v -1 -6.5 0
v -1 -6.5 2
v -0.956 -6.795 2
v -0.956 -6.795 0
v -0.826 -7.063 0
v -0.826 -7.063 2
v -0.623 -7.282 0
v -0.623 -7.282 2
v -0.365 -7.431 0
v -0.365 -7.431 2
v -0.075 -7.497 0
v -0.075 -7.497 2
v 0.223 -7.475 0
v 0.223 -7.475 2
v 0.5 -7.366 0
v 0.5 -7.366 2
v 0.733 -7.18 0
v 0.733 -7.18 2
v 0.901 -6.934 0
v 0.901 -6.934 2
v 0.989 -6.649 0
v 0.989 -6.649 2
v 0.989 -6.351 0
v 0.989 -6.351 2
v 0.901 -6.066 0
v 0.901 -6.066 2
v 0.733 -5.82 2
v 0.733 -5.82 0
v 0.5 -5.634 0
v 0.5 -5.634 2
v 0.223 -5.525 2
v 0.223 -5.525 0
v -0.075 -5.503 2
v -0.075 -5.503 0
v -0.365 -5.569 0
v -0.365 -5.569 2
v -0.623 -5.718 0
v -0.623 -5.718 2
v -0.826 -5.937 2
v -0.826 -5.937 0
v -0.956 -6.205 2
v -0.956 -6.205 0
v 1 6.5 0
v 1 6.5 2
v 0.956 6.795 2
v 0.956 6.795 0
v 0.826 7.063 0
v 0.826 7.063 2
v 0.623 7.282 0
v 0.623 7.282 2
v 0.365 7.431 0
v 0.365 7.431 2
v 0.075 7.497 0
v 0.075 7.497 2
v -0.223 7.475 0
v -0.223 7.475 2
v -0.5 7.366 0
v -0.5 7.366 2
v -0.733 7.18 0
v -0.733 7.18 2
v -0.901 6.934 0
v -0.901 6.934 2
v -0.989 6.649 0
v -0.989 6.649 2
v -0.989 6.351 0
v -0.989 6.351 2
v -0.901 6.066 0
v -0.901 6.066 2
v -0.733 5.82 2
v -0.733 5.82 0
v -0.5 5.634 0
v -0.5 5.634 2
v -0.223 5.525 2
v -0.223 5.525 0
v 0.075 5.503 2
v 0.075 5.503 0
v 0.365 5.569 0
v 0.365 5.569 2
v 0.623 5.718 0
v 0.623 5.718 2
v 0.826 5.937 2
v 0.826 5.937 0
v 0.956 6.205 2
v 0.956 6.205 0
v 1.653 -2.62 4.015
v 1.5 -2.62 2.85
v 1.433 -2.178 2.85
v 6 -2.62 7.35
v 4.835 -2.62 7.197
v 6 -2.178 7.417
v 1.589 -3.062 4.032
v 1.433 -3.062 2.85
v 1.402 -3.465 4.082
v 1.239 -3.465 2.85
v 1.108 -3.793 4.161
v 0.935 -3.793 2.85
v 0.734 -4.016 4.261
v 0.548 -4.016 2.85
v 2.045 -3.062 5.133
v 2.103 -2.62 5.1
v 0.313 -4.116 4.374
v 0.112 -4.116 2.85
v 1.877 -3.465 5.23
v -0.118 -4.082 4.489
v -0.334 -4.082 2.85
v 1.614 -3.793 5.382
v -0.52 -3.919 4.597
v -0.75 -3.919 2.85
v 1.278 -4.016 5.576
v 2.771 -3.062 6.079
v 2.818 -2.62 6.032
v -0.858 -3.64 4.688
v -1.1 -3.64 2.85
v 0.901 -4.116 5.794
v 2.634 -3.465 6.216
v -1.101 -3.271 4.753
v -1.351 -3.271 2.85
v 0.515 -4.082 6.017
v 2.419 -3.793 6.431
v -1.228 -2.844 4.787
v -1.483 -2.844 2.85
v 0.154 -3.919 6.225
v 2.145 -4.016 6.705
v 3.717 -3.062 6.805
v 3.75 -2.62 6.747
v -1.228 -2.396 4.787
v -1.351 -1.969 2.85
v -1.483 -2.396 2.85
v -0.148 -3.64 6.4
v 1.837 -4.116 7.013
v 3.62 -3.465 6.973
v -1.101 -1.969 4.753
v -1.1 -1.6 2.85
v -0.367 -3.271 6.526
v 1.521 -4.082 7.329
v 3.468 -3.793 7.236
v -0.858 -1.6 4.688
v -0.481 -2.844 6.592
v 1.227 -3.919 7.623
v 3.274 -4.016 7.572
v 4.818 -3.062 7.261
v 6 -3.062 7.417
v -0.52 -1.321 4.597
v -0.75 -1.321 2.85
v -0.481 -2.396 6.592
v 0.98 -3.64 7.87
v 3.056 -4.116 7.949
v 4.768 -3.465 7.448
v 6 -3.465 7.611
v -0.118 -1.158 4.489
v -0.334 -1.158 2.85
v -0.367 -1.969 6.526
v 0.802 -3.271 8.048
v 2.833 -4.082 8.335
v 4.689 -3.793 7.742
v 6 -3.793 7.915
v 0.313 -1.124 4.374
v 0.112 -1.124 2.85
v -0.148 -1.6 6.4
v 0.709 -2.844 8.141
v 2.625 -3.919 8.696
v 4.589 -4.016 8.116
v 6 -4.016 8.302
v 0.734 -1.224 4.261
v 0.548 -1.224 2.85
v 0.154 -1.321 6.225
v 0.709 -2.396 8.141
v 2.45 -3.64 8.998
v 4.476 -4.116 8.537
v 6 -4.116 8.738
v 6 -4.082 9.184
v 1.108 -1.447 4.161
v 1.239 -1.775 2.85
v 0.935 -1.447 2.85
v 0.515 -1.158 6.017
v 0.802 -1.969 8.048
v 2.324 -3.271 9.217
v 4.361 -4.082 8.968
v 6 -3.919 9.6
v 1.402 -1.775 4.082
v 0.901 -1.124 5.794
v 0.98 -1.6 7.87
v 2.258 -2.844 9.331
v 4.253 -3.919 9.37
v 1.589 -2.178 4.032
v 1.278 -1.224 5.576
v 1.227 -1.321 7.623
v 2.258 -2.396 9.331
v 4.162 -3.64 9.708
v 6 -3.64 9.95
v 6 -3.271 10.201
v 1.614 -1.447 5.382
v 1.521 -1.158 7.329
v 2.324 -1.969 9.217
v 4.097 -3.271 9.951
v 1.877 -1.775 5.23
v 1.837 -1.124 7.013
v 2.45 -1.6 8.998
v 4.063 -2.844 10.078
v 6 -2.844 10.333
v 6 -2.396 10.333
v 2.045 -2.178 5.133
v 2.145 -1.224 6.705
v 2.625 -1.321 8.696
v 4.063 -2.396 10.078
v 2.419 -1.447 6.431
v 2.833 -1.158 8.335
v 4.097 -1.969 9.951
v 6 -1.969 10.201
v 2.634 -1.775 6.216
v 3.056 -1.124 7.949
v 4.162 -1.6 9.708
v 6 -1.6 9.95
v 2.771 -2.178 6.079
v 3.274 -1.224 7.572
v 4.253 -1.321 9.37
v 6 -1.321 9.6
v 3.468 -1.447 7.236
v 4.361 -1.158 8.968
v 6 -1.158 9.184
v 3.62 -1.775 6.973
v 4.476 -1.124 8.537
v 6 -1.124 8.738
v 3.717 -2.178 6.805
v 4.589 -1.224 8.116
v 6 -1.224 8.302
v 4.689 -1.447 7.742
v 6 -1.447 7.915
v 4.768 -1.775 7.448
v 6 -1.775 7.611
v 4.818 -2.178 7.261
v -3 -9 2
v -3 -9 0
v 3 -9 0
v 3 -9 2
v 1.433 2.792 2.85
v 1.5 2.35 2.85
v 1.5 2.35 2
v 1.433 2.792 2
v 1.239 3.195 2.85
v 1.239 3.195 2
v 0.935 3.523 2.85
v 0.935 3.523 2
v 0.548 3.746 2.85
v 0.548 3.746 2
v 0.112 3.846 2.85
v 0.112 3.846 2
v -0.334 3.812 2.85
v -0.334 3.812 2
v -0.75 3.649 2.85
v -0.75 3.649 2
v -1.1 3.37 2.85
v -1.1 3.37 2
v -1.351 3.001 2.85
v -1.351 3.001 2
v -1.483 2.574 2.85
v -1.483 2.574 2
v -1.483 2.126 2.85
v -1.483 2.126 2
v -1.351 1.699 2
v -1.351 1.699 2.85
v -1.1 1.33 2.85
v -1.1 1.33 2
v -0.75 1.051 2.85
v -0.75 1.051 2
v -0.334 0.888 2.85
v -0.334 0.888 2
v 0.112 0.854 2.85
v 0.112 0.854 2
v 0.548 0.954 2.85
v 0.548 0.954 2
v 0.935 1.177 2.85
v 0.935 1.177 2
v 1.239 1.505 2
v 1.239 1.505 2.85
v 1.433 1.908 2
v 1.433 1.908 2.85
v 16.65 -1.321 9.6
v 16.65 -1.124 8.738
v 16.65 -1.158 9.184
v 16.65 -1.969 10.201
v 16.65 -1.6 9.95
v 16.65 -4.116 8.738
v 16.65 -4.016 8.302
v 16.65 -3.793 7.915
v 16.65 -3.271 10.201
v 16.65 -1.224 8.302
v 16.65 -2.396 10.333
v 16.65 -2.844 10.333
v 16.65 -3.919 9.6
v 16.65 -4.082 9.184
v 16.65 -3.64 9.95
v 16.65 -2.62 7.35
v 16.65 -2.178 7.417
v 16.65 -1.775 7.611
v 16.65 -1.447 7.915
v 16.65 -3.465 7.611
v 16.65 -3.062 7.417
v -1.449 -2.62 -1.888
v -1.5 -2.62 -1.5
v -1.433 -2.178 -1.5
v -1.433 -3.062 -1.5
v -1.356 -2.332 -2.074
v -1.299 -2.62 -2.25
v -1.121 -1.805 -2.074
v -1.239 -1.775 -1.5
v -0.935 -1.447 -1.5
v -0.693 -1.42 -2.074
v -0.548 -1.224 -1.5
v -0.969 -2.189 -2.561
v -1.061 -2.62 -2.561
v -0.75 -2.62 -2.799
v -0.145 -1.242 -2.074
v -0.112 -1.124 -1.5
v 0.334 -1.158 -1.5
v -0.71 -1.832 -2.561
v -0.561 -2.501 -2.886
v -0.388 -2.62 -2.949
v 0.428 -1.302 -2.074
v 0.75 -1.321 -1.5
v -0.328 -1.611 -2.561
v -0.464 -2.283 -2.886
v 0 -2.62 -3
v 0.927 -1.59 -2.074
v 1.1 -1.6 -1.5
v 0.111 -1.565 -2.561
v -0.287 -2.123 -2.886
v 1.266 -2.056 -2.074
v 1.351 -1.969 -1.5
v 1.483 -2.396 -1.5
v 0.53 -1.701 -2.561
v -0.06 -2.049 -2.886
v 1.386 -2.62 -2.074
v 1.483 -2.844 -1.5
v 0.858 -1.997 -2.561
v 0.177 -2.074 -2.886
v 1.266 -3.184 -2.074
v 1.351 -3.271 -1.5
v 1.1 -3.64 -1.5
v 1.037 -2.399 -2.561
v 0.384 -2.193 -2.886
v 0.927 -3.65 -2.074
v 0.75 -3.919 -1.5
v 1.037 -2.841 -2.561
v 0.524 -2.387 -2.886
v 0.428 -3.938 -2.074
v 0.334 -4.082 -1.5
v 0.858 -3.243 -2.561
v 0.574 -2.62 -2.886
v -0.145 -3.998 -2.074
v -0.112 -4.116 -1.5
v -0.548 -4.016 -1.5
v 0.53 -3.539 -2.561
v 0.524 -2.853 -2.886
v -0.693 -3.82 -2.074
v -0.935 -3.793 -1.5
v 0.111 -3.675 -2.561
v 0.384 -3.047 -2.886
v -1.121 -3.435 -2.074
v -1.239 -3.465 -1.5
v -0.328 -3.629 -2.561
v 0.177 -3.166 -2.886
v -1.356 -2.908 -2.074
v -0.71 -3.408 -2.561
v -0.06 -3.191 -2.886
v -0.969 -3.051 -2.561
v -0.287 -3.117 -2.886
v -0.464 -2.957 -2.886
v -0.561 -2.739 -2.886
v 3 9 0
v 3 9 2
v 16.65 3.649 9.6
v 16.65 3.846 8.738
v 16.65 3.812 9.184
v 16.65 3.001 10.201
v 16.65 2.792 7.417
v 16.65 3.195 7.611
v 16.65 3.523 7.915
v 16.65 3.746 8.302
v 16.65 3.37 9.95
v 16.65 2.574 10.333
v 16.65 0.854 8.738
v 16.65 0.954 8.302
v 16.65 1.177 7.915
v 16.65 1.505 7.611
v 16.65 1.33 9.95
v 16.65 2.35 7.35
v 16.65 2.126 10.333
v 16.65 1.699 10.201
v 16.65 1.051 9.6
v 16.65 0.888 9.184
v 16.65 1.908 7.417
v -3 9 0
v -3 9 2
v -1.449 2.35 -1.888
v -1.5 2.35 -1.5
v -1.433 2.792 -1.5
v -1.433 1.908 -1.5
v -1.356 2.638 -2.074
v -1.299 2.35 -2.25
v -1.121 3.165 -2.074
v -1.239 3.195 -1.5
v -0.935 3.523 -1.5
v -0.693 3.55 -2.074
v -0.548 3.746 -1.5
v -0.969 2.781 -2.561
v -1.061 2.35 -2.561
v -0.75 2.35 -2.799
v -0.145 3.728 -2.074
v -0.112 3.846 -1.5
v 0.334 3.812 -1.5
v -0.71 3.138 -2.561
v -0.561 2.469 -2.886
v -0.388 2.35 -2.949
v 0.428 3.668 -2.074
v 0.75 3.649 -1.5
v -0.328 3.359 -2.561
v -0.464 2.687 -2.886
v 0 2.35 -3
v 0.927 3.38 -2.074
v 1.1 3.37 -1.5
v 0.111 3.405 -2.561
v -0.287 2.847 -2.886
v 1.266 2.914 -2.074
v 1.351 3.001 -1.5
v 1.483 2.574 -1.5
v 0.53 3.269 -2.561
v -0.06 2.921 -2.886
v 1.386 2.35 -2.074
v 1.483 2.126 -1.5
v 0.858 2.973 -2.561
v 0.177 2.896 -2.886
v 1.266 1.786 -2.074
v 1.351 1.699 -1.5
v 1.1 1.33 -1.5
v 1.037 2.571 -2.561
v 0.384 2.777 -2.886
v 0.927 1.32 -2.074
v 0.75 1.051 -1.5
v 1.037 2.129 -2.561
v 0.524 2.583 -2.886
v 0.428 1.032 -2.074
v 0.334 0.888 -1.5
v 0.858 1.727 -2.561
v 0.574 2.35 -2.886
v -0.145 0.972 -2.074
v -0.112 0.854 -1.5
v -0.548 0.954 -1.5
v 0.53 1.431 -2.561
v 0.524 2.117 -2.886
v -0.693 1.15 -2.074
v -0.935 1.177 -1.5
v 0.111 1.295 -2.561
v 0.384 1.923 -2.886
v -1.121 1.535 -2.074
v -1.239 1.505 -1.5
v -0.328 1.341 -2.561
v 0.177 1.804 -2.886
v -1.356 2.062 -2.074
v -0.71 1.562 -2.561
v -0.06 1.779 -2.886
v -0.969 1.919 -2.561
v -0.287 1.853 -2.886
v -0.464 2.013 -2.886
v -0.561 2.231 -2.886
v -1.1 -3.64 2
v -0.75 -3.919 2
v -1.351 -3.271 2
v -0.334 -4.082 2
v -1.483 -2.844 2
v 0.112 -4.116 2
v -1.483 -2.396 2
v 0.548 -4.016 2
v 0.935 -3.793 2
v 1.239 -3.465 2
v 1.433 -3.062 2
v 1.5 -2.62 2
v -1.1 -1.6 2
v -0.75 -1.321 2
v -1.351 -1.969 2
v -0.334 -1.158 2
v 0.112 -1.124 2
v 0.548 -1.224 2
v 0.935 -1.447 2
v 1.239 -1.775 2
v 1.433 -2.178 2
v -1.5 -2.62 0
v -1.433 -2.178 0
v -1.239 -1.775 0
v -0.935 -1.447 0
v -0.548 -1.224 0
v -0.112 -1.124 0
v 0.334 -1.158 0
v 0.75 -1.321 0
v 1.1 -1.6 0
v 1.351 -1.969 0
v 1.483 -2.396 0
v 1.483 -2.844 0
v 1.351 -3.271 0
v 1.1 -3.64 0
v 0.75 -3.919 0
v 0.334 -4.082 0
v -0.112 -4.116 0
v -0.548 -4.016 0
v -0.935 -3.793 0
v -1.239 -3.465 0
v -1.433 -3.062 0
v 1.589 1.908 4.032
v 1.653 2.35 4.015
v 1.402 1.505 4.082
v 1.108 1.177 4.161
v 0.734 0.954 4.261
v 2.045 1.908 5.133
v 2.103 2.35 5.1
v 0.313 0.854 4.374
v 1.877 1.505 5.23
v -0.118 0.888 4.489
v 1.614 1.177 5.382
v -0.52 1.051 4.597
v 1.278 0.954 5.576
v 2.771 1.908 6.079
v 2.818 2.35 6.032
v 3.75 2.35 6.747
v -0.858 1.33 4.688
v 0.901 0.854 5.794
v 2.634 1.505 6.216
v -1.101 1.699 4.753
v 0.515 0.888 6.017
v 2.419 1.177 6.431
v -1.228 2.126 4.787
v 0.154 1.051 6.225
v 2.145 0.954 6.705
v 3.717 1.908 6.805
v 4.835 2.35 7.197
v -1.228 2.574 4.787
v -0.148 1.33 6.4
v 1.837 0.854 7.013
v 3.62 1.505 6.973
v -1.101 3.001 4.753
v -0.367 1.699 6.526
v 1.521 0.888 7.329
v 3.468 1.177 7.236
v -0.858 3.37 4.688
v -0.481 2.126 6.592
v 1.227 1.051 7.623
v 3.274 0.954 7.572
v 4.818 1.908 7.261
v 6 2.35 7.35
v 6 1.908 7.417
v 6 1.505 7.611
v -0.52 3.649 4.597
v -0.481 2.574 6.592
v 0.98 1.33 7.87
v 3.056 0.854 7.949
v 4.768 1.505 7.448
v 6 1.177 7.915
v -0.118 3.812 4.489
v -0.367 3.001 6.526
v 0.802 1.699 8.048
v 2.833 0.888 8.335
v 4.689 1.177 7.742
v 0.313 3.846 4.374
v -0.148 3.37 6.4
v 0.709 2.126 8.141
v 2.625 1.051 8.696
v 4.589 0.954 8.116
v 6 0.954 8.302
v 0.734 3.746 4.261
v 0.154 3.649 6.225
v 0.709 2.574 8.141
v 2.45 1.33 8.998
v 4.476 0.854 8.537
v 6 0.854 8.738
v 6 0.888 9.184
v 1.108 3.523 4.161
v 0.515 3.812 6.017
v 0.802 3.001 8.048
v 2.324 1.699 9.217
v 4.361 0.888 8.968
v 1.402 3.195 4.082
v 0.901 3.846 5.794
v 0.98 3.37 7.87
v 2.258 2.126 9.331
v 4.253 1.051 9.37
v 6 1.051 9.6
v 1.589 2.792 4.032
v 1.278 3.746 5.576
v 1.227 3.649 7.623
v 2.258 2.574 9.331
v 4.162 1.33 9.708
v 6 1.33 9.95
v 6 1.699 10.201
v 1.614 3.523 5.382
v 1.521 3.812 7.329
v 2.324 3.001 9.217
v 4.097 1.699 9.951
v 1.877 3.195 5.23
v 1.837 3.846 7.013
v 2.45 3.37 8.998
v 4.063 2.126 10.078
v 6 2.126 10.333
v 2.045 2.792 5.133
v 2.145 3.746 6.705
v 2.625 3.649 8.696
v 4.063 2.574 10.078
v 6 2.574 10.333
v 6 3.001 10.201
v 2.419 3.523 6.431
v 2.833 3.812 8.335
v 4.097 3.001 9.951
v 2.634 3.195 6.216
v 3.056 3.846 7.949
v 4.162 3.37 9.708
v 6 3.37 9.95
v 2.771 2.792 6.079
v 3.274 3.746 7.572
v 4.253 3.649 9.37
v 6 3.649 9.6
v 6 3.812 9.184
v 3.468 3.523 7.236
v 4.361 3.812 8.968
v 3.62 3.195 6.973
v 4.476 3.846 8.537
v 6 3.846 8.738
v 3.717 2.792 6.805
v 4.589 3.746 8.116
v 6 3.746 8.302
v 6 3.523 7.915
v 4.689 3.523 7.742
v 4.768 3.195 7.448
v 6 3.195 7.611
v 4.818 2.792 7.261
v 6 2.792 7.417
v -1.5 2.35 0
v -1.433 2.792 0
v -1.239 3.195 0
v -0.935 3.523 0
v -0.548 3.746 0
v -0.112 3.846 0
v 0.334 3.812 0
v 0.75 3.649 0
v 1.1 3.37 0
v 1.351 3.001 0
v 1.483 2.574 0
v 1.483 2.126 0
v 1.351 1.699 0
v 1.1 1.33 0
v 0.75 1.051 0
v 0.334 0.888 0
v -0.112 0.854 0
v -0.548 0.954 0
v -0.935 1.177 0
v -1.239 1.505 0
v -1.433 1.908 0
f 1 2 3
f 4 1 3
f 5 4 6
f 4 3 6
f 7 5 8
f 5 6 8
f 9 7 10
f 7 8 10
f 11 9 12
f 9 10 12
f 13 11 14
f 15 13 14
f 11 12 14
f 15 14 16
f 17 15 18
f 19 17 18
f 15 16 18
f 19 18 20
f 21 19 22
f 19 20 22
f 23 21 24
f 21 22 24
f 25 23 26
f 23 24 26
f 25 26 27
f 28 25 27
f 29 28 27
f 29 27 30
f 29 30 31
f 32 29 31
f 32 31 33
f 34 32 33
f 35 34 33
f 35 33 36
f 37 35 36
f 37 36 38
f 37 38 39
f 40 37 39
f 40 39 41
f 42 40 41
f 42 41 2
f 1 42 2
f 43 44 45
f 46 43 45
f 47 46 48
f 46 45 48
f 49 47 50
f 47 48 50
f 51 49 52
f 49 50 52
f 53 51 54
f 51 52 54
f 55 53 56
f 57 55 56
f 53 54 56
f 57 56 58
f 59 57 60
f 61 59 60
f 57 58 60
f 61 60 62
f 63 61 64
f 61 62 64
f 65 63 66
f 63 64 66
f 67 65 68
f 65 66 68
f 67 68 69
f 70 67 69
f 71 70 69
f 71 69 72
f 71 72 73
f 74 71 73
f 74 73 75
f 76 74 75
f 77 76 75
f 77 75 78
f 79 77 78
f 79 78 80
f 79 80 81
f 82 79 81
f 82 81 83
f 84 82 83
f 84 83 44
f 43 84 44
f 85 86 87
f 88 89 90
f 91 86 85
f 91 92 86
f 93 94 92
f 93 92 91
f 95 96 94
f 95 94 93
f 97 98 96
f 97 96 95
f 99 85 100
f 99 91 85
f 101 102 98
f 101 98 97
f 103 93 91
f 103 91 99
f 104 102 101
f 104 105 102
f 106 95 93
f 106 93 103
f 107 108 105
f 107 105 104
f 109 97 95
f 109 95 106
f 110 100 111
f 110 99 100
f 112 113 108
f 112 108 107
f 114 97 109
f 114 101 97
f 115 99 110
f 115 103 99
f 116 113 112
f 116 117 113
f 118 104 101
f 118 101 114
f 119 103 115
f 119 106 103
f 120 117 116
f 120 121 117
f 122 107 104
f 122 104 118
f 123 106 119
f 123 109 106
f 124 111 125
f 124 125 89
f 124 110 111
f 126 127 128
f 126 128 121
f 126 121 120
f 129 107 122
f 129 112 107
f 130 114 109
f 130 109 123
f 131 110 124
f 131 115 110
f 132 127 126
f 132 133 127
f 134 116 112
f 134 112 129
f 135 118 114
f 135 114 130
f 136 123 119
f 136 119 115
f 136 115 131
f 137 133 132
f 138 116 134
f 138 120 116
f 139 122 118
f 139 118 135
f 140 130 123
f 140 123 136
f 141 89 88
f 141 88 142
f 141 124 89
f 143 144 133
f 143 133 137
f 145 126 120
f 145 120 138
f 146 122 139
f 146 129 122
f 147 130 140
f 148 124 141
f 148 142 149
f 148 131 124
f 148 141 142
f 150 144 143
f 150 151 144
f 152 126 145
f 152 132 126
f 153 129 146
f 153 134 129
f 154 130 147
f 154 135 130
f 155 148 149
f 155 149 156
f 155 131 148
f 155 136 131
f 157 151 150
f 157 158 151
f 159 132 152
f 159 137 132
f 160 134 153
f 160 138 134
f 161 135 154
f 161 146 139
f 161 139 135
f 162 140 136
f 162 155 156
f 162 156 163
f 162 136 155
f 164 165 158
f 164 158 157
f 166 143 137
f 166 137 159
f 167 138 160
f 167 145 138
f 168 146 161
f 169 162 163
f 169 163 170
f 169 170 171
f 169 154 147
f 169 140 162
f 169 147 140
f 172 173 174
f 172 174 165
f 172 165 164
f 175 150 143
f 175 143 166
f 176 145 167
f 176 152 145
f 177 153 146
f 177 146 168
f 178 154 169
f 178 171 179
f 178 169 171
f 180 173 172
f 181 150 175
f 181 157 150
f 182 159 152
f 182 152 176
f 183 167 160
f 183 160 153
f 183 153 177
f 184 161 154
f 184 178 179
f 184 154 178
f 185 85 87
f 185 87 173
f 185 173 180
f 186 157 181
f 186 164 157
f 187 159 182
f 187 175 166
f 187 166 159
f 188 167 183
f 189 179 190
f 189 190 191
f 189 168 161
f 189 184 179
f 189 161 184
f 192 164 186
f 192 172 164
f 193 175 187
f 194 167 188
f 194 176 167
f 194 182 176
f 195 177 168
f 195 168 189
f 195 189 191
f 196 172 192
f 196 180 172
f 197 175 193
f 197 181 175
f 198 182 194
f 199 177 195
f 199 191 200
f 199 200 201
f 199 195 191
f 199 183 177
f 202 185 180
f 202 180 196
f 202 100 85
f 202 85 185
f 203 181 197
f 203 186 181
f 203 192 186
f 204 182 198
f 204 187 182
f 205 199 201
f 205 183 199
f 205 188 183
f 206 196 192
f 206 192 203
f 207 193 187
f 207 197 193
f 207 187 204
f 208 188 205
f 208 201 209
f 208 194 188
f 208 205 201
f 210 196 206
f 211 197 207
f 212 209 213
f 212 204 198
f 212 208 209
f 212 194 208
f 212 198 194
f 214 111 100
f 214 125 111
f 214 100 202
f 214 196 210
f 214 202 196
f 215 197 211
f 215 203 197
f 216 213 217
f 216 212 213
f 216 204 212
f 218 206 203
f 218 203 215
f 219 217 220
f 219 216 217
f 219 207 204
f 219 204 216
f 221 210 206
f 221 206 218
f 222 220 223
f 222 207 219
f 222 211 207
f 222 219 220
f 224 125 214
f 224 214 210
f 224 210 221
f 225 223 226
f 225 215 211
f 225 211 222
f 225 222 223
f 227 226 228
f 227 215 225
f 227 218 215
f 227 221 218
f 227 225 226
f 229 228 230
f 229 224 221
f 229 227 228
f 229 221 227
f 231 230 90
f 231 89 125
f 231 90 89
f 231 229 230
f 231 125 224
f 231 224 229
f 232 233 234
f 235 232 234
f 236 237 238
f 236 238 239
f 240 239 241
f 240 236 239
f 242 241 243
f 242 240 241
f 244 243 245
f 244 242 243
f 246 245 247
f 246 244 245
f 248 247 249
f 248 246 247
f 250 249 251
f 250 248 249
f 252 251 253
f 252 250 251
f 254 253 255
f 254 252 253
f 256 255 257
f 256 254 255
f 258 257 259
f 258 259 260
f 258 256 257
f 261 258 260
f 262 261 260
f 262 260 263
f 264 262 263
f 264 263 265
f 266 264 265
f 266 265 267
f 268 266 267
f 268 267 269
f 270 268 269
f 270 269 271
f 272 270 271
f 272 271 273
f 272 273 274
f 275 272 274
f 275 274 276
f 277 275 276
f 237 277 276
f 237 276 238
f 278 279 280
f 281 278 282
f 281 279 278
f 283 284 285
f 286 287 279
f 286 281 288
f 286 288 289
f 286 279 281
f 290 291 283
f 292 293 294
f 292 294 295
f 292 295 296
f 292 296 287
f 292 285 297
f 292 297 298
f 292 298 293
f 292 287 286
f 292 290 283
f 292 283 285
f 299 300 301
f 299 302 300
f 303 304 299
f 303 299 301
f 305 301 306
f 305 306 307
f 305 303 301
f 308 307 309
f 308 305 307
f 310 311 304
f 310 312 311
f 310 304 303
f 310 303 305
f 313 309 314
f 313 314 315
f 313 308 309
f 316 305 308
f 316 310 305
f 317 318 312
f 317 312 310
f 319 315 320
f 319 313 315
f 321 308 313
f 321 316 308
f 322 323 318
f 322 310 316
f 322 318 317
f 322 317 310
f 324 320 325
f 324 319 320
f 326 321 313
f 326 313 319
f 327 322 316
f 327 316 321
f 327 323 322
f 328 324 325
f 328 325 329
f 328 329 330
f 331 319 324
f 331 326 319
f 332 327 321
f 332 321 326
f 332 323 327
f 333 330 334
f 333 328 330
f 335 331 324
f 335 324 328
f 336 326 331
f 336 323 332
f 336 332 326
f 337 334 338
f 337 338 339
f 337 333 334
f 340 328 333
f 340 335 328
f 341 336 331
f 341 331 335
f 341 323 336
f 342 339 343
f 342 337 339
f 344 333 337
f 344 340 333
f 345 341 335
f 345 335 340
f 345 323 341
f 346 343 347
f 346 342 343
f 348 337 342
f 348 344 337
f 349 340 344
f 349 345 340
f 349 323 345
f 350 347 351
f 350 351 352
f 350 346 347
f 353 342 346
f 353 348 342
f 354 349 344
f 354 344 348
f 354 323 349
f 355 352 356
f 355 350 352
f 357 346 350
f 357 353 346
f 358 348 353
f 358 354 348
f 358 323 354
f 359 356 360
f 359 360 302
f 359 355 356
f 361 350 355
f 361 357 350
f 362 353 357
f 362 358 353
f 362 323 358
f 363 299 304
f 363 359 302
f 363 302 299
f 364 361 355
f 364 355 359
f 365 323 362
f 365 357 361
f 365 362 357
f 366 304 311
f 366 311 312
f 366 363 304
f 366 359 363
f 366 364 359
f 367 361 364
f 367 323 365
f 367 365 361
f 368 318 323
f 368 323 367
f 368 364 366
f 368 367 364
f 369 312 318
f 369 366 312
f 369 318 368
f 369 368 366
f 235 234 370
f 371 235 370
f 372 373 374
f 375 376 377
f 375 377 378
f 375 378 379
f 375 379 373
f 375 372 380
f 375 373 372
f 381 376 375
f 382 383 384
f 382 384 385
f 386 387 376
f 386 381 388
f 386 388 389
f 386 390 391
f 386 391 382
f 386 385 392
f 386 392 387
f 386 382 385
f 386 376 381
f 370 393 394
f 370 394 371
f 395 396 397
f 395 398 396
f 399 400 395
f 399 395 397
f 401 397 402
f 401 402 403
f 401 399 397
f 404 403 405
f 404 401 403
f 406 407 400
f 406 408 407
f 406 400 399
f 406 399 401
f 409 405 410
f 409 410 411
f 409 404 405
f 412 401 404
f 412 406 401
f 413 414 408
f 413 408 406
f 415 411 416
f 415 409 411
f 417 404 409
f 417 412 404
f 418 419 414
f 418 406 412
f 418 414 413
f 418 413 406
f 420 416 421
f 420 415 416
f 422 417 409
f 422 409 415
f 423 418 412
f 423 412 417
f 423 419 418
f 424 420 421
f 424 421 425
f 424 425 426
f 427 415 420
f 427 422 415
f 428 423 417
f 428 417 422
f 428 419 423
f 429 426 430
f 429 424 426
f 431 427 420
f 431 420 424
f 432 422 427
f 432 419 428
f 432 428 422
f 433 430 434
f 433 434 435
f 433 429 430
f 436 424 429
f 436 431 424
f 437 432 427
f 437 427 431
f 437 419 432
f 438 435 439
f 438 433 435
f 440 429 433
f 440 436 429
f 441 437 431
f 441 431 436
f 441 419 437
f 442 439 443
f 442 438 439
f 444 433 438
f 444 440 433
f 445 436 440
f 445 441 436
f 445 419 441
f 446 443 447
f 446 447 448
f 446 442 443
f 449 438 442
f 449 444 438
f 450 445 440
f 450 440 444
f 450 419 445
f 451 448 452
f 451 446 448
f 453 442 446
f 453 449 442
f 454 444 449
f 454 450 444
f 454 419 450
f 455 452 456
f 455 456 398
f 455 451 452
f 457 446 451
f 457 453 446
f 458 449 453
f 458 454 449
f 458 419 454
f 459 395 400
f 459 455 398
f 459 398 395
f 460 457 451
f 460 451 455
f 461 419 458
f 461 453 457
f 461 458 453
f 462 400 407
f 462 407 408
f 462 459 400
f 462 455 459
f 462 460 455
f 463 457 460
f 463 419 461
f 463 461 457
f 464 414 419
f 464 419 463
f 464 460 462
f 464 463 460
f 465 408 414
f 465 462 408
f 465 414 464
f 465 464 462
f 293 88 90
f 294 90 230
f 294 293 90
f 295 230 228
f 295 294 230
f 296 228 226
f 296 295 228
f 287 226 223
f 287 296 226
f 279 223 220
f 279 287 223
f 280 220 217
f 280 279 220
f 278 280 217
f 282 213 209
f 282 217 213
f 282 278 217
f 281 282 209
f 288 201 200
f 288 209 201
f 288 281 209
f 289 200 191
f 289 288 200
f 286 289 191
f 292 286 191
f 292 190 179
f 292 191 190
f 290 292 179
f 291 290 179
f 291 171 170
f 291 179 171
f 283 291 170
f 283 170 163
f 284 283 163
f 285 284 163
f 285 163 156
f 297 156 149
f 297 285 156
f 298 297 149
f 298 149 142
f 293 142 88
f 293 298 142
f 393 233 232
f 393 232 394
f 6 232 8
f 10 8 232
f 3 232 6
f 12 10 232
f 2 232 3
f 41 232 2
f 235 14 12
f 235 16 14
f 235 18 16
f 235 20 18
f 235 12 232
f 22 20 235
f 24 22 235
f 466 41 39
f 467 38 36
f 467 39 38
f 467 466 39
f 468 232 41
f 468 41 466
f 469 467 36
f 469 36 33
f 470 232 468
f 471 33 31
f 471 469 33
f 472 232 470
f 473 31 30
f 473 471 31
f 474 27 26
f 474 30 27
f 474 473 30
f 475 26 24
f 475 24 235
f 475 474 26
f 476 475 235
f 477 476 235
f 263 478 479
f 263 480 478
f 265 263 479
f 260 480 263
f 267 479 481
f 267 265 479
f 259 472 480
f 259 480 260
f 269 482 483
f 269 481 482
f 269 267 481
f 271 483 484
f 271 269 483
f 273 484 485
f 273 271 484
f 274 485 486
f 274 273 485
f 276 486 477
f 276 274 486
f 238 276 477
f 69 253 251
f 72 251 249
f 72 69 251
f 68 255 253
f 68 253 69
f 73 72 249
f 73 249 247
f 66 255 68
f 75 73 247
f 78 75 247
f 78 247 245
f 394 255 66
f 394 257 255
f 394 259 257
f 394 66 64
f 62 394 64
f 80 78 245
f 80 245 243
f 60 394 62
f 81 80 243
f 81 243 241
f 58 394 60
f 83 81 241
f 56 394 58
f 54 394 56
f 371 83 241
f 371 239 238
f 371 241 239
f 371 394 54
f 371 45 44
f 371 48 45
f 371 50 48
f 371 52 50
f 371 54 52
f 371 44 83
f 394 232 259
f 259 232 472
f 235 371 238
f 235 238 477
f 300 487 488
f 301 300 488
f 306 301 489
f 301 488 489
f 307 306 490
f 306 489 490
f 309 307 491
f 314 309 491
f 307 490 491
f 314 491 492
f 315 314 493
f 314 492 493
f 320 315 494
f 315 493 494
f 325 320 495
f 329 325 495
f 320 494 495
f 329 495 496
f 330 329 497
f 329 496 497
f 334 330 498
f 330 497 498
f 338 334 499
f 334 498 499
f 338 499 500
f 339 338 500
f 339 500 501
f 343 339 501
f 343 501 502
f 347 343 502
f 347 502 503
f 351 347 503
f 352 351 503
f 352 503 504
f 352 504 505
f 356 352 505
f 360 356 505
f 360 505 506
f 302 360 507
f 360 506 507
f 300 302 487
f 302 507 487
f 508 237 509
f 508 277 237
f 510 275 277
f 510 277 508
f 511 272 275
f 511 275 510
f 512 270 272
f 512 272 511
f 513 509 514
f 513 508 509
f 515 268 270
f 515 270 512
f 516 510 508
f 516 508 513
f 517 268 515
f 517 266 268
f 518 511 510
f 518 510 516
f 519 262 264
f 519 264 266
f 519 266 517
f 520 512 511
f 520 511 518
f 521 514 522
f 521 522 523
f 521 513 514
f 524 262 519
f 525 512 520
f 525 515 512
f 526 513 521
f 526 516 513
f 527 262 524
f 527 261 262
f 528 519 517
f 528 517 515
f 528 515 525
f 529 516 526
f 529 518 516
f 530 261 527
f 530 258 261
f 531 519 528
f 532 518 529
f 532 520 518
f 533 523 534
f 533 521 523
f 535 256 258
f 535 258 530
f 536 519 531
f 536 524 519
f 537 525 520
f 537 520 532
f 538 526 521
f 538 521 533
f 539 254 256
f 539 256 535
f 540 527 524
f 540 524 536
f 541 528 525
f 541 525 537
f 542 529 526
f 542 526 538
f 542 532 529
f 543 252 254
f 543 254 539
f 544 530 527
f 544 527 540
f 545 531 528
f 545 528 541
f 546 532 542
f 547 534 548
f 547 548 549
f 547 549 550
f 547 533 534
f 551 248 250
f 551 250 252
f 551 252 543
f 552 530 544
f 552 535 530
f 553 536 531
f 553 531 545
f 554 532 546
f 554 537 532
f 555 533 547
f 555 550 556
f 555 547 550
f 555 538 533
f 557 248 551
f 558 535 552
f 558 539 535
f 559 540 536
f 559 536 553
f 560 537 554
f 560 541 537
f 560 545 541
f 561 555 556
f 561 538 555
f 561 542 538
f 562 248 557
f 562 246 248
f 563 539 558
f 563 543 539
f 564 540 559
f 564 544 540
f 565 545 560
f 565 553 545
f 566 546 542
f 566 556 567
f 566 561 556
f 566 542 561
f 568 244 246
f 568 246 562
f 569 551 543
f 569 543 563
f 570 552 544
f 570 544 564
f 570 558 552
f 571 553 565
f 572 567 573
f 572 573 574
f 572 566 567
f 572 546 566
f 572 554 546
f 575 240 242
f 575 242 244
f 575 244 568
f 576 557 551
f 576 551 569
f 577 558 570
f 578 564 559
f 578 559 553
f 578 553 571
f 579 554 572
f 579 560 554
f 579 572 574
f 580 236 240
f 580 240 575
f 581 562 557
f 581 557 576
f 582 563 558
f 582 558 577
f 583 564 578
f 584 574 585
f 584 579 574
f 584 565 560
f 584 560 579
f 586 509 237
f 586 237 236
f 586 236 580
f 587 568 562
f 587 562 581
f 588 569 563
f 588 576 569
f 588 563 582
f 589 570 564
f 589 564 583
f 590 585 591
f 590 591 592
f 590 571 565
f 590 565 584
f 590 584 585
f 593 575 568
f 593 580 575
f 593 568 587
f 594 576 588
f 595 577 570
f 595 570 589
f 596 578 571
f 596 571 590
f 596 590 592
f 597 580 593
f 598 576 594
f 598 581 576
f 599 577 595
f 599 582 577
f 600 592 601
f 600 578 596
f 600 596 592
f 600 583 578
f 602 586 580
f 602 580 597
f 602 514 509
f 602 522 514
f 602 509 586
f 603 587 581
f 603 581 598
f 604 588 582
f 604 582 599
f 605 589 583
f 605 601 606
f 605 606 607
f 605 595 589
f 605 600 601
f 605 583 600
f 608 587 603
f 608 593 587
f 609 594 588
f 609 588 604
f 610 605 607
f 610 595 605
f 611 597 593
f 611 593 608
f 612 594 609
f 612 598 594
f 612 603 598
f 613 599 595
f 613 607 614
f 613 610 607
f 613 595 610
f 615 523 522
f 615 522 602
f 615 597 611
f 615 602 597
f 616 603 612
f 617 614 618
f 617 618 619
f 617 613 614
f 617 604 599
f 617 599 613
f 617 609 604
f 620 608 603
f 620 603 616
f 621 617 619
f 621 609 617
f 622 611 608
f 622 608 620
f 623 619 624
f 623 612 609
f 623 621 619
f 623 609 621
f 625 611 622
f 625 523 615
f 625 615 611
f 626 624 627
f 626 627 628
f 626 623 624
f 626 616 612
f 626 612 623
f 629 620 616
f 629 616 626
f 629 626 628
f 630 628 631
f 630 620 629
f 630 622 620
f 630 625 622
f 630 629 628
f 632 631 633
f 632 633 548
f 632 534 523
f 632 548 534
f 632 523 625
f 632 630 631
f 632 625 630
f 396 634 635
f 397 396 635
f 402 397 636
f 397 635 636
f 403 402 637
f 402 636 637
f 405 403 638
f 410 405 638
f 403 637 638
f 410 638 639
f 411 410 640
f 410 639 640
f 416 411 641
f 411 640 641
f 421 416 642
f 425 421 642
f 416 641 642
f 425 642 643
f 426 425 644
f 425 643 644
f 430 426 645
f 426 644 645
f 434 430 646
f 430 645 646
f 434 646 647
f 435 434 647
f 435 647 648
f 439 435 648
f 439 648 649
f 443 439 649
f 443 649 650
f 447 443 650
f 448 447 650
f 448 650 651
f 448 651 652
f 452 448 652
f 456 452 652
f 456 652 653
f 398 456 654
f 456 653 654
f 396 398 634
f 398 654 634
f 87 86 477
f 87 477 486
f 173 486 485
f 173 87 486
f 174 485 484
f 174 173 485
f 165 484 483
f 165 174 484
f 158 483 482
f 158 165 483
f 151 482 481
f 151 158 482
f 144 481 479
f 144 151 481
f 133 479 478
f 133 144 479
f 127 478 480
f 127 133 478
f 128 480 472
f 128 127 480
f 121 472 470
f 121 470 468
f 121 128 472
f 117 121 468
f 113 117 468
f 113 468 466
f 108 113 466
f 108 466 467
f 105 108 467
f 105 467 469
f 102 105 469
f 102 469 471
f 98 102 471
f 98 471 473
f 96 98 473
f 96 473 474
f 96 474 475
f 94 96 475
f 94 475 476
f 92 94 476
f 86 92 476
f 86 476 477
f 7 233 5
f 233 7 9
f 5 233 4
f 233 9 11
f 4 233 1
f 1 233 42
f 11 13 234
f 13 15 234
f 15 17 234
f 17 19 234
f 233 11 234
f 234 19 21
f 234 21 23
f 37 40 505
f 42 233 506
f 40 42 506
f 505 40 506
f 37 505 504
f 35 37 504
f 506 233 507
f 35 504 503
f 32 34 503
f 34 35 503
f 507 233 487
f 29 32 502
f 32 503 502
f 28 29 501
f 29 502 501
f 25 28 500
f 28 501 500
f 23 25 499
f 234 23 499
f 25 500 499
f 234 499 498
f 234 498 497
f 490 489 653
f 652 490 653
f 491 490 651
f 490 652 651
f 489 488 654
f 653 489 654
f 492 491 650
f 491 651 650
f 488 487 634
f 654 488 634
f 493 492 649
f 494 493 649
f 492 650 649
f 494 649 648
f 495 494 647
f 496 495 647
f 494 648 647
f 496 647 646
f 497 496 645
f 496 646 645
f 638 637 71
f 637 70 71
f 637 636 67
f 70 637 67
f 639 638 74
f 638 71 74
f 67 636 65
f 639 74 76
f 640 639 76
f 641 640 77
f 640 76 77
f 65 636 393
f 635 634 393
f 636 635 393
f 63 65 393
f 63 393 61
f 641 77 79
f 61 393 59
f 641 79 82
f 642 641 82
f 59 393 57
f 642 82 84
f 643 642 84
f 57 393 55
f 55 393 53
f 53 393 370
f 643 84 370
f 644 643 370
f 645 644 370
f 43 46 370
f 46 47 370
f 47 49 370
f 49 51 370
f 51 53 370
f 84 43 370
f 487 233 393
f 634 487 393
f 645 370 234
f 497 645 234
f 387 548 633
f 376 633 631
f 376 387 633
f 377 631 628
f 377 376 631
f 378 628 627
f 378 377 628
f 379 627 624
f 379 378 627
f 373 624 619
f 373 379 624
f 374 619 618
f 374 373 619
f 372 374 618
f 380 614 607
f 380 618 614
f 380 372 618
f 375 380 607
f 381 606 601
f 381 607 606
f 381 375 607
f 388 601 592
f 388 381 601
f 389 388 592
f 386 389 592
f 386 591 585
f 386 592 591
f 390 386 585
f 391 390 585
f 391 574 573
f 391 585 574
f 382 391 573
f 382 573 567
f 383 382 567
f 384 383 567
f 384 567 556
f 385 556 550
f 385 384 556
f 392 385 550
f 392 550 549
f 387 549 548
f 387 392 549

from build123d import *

# Parameters (mm, degrees)
SKETCH1_W           = 6
SKETCH1_H           = 18
BOSS_EXTRUDE1_DEPTH = 2
SKETCH2_R           = 1.5
BOSS_EXTRUDE2_DEPTH = 3
FILLET1_R           = 1.5
SKETCH3_R           = 1.5
SKETCH5_R           = 1
CUT_EXTRUDE1_DEPTH  = 21.686831601


with BuildPart() as part:
    # Sketch1 → Boss-Extrude1 (new body)
    with BuildSketch(Plane.XY):
        Rectangle(SKETCH1_W, SKETCH1_H)
    extrude(amount=BOSS_EXTRUDE1_DEPTH)

    # Sketch2 → Boss-Extrude2 (add)
    with BuildSketch(Plane(origin=(0, 0, 0), x_dir=(-1, 0, 0), z_dir=(0, 0, -1))):
        with Locations((0, 2.35)):
            Circle(SKETCH2_R)
        with Locations((0, -2.62)):
            Circle(SKETCH2_R)
    extrude(amount=BOSS_EXTRUDE2_DEPTH)

    # Fillet1
    fillet1_edges = [part.edges().sort_by_distance(p)[0] for p in [
        (1.5, 2.35, -3),
        (1.5, -2.62, -3),
    ]]
    fillet(fillet1_edges, radius=FILLET1_R)

    # Sweep1: sweep along a path in Sketch4
    with BuildLine(Plane(origin=(0, 2.35, 0), x_dir=(-1, 0, 0), z_dir=(0, 1, 0))) as sweep1_path:
        Line((0, 2), (0, 2.85))
        ThreePointArc((0, 2.85), (-1.757359313, 7.092640687), (-6, 8.85))
        Line((-6, 8.85), (-16.65, 8.85))
    # Sketch3 → Sweep1 (sweep)
    with BuildSketch(Plane.XY.offset(2)):
        with Locations((0, -2.62)):
            Circle(SKETCH3_R)
        with Locations((0, 2.35)):
            Circle(SKETCH3_R)
    sweep(path=sweep1_path.line)

    # Sketch5 → Cut-Extrude1 (cut, through all)
    with BuildSketch(Plane.XY.offset(2)):
        with Locations((0, 6.5)):
            Circle(SKETCH5_R)
        with Locations(Location((0, -6.5, 0), (0, 0, 180))):
            Circle(SKETCH5_R)
    extrude(amount=-CUT_EXTRUDE1_DEPTH, mode=Mode.SUBTRACT)


solid = part.part
